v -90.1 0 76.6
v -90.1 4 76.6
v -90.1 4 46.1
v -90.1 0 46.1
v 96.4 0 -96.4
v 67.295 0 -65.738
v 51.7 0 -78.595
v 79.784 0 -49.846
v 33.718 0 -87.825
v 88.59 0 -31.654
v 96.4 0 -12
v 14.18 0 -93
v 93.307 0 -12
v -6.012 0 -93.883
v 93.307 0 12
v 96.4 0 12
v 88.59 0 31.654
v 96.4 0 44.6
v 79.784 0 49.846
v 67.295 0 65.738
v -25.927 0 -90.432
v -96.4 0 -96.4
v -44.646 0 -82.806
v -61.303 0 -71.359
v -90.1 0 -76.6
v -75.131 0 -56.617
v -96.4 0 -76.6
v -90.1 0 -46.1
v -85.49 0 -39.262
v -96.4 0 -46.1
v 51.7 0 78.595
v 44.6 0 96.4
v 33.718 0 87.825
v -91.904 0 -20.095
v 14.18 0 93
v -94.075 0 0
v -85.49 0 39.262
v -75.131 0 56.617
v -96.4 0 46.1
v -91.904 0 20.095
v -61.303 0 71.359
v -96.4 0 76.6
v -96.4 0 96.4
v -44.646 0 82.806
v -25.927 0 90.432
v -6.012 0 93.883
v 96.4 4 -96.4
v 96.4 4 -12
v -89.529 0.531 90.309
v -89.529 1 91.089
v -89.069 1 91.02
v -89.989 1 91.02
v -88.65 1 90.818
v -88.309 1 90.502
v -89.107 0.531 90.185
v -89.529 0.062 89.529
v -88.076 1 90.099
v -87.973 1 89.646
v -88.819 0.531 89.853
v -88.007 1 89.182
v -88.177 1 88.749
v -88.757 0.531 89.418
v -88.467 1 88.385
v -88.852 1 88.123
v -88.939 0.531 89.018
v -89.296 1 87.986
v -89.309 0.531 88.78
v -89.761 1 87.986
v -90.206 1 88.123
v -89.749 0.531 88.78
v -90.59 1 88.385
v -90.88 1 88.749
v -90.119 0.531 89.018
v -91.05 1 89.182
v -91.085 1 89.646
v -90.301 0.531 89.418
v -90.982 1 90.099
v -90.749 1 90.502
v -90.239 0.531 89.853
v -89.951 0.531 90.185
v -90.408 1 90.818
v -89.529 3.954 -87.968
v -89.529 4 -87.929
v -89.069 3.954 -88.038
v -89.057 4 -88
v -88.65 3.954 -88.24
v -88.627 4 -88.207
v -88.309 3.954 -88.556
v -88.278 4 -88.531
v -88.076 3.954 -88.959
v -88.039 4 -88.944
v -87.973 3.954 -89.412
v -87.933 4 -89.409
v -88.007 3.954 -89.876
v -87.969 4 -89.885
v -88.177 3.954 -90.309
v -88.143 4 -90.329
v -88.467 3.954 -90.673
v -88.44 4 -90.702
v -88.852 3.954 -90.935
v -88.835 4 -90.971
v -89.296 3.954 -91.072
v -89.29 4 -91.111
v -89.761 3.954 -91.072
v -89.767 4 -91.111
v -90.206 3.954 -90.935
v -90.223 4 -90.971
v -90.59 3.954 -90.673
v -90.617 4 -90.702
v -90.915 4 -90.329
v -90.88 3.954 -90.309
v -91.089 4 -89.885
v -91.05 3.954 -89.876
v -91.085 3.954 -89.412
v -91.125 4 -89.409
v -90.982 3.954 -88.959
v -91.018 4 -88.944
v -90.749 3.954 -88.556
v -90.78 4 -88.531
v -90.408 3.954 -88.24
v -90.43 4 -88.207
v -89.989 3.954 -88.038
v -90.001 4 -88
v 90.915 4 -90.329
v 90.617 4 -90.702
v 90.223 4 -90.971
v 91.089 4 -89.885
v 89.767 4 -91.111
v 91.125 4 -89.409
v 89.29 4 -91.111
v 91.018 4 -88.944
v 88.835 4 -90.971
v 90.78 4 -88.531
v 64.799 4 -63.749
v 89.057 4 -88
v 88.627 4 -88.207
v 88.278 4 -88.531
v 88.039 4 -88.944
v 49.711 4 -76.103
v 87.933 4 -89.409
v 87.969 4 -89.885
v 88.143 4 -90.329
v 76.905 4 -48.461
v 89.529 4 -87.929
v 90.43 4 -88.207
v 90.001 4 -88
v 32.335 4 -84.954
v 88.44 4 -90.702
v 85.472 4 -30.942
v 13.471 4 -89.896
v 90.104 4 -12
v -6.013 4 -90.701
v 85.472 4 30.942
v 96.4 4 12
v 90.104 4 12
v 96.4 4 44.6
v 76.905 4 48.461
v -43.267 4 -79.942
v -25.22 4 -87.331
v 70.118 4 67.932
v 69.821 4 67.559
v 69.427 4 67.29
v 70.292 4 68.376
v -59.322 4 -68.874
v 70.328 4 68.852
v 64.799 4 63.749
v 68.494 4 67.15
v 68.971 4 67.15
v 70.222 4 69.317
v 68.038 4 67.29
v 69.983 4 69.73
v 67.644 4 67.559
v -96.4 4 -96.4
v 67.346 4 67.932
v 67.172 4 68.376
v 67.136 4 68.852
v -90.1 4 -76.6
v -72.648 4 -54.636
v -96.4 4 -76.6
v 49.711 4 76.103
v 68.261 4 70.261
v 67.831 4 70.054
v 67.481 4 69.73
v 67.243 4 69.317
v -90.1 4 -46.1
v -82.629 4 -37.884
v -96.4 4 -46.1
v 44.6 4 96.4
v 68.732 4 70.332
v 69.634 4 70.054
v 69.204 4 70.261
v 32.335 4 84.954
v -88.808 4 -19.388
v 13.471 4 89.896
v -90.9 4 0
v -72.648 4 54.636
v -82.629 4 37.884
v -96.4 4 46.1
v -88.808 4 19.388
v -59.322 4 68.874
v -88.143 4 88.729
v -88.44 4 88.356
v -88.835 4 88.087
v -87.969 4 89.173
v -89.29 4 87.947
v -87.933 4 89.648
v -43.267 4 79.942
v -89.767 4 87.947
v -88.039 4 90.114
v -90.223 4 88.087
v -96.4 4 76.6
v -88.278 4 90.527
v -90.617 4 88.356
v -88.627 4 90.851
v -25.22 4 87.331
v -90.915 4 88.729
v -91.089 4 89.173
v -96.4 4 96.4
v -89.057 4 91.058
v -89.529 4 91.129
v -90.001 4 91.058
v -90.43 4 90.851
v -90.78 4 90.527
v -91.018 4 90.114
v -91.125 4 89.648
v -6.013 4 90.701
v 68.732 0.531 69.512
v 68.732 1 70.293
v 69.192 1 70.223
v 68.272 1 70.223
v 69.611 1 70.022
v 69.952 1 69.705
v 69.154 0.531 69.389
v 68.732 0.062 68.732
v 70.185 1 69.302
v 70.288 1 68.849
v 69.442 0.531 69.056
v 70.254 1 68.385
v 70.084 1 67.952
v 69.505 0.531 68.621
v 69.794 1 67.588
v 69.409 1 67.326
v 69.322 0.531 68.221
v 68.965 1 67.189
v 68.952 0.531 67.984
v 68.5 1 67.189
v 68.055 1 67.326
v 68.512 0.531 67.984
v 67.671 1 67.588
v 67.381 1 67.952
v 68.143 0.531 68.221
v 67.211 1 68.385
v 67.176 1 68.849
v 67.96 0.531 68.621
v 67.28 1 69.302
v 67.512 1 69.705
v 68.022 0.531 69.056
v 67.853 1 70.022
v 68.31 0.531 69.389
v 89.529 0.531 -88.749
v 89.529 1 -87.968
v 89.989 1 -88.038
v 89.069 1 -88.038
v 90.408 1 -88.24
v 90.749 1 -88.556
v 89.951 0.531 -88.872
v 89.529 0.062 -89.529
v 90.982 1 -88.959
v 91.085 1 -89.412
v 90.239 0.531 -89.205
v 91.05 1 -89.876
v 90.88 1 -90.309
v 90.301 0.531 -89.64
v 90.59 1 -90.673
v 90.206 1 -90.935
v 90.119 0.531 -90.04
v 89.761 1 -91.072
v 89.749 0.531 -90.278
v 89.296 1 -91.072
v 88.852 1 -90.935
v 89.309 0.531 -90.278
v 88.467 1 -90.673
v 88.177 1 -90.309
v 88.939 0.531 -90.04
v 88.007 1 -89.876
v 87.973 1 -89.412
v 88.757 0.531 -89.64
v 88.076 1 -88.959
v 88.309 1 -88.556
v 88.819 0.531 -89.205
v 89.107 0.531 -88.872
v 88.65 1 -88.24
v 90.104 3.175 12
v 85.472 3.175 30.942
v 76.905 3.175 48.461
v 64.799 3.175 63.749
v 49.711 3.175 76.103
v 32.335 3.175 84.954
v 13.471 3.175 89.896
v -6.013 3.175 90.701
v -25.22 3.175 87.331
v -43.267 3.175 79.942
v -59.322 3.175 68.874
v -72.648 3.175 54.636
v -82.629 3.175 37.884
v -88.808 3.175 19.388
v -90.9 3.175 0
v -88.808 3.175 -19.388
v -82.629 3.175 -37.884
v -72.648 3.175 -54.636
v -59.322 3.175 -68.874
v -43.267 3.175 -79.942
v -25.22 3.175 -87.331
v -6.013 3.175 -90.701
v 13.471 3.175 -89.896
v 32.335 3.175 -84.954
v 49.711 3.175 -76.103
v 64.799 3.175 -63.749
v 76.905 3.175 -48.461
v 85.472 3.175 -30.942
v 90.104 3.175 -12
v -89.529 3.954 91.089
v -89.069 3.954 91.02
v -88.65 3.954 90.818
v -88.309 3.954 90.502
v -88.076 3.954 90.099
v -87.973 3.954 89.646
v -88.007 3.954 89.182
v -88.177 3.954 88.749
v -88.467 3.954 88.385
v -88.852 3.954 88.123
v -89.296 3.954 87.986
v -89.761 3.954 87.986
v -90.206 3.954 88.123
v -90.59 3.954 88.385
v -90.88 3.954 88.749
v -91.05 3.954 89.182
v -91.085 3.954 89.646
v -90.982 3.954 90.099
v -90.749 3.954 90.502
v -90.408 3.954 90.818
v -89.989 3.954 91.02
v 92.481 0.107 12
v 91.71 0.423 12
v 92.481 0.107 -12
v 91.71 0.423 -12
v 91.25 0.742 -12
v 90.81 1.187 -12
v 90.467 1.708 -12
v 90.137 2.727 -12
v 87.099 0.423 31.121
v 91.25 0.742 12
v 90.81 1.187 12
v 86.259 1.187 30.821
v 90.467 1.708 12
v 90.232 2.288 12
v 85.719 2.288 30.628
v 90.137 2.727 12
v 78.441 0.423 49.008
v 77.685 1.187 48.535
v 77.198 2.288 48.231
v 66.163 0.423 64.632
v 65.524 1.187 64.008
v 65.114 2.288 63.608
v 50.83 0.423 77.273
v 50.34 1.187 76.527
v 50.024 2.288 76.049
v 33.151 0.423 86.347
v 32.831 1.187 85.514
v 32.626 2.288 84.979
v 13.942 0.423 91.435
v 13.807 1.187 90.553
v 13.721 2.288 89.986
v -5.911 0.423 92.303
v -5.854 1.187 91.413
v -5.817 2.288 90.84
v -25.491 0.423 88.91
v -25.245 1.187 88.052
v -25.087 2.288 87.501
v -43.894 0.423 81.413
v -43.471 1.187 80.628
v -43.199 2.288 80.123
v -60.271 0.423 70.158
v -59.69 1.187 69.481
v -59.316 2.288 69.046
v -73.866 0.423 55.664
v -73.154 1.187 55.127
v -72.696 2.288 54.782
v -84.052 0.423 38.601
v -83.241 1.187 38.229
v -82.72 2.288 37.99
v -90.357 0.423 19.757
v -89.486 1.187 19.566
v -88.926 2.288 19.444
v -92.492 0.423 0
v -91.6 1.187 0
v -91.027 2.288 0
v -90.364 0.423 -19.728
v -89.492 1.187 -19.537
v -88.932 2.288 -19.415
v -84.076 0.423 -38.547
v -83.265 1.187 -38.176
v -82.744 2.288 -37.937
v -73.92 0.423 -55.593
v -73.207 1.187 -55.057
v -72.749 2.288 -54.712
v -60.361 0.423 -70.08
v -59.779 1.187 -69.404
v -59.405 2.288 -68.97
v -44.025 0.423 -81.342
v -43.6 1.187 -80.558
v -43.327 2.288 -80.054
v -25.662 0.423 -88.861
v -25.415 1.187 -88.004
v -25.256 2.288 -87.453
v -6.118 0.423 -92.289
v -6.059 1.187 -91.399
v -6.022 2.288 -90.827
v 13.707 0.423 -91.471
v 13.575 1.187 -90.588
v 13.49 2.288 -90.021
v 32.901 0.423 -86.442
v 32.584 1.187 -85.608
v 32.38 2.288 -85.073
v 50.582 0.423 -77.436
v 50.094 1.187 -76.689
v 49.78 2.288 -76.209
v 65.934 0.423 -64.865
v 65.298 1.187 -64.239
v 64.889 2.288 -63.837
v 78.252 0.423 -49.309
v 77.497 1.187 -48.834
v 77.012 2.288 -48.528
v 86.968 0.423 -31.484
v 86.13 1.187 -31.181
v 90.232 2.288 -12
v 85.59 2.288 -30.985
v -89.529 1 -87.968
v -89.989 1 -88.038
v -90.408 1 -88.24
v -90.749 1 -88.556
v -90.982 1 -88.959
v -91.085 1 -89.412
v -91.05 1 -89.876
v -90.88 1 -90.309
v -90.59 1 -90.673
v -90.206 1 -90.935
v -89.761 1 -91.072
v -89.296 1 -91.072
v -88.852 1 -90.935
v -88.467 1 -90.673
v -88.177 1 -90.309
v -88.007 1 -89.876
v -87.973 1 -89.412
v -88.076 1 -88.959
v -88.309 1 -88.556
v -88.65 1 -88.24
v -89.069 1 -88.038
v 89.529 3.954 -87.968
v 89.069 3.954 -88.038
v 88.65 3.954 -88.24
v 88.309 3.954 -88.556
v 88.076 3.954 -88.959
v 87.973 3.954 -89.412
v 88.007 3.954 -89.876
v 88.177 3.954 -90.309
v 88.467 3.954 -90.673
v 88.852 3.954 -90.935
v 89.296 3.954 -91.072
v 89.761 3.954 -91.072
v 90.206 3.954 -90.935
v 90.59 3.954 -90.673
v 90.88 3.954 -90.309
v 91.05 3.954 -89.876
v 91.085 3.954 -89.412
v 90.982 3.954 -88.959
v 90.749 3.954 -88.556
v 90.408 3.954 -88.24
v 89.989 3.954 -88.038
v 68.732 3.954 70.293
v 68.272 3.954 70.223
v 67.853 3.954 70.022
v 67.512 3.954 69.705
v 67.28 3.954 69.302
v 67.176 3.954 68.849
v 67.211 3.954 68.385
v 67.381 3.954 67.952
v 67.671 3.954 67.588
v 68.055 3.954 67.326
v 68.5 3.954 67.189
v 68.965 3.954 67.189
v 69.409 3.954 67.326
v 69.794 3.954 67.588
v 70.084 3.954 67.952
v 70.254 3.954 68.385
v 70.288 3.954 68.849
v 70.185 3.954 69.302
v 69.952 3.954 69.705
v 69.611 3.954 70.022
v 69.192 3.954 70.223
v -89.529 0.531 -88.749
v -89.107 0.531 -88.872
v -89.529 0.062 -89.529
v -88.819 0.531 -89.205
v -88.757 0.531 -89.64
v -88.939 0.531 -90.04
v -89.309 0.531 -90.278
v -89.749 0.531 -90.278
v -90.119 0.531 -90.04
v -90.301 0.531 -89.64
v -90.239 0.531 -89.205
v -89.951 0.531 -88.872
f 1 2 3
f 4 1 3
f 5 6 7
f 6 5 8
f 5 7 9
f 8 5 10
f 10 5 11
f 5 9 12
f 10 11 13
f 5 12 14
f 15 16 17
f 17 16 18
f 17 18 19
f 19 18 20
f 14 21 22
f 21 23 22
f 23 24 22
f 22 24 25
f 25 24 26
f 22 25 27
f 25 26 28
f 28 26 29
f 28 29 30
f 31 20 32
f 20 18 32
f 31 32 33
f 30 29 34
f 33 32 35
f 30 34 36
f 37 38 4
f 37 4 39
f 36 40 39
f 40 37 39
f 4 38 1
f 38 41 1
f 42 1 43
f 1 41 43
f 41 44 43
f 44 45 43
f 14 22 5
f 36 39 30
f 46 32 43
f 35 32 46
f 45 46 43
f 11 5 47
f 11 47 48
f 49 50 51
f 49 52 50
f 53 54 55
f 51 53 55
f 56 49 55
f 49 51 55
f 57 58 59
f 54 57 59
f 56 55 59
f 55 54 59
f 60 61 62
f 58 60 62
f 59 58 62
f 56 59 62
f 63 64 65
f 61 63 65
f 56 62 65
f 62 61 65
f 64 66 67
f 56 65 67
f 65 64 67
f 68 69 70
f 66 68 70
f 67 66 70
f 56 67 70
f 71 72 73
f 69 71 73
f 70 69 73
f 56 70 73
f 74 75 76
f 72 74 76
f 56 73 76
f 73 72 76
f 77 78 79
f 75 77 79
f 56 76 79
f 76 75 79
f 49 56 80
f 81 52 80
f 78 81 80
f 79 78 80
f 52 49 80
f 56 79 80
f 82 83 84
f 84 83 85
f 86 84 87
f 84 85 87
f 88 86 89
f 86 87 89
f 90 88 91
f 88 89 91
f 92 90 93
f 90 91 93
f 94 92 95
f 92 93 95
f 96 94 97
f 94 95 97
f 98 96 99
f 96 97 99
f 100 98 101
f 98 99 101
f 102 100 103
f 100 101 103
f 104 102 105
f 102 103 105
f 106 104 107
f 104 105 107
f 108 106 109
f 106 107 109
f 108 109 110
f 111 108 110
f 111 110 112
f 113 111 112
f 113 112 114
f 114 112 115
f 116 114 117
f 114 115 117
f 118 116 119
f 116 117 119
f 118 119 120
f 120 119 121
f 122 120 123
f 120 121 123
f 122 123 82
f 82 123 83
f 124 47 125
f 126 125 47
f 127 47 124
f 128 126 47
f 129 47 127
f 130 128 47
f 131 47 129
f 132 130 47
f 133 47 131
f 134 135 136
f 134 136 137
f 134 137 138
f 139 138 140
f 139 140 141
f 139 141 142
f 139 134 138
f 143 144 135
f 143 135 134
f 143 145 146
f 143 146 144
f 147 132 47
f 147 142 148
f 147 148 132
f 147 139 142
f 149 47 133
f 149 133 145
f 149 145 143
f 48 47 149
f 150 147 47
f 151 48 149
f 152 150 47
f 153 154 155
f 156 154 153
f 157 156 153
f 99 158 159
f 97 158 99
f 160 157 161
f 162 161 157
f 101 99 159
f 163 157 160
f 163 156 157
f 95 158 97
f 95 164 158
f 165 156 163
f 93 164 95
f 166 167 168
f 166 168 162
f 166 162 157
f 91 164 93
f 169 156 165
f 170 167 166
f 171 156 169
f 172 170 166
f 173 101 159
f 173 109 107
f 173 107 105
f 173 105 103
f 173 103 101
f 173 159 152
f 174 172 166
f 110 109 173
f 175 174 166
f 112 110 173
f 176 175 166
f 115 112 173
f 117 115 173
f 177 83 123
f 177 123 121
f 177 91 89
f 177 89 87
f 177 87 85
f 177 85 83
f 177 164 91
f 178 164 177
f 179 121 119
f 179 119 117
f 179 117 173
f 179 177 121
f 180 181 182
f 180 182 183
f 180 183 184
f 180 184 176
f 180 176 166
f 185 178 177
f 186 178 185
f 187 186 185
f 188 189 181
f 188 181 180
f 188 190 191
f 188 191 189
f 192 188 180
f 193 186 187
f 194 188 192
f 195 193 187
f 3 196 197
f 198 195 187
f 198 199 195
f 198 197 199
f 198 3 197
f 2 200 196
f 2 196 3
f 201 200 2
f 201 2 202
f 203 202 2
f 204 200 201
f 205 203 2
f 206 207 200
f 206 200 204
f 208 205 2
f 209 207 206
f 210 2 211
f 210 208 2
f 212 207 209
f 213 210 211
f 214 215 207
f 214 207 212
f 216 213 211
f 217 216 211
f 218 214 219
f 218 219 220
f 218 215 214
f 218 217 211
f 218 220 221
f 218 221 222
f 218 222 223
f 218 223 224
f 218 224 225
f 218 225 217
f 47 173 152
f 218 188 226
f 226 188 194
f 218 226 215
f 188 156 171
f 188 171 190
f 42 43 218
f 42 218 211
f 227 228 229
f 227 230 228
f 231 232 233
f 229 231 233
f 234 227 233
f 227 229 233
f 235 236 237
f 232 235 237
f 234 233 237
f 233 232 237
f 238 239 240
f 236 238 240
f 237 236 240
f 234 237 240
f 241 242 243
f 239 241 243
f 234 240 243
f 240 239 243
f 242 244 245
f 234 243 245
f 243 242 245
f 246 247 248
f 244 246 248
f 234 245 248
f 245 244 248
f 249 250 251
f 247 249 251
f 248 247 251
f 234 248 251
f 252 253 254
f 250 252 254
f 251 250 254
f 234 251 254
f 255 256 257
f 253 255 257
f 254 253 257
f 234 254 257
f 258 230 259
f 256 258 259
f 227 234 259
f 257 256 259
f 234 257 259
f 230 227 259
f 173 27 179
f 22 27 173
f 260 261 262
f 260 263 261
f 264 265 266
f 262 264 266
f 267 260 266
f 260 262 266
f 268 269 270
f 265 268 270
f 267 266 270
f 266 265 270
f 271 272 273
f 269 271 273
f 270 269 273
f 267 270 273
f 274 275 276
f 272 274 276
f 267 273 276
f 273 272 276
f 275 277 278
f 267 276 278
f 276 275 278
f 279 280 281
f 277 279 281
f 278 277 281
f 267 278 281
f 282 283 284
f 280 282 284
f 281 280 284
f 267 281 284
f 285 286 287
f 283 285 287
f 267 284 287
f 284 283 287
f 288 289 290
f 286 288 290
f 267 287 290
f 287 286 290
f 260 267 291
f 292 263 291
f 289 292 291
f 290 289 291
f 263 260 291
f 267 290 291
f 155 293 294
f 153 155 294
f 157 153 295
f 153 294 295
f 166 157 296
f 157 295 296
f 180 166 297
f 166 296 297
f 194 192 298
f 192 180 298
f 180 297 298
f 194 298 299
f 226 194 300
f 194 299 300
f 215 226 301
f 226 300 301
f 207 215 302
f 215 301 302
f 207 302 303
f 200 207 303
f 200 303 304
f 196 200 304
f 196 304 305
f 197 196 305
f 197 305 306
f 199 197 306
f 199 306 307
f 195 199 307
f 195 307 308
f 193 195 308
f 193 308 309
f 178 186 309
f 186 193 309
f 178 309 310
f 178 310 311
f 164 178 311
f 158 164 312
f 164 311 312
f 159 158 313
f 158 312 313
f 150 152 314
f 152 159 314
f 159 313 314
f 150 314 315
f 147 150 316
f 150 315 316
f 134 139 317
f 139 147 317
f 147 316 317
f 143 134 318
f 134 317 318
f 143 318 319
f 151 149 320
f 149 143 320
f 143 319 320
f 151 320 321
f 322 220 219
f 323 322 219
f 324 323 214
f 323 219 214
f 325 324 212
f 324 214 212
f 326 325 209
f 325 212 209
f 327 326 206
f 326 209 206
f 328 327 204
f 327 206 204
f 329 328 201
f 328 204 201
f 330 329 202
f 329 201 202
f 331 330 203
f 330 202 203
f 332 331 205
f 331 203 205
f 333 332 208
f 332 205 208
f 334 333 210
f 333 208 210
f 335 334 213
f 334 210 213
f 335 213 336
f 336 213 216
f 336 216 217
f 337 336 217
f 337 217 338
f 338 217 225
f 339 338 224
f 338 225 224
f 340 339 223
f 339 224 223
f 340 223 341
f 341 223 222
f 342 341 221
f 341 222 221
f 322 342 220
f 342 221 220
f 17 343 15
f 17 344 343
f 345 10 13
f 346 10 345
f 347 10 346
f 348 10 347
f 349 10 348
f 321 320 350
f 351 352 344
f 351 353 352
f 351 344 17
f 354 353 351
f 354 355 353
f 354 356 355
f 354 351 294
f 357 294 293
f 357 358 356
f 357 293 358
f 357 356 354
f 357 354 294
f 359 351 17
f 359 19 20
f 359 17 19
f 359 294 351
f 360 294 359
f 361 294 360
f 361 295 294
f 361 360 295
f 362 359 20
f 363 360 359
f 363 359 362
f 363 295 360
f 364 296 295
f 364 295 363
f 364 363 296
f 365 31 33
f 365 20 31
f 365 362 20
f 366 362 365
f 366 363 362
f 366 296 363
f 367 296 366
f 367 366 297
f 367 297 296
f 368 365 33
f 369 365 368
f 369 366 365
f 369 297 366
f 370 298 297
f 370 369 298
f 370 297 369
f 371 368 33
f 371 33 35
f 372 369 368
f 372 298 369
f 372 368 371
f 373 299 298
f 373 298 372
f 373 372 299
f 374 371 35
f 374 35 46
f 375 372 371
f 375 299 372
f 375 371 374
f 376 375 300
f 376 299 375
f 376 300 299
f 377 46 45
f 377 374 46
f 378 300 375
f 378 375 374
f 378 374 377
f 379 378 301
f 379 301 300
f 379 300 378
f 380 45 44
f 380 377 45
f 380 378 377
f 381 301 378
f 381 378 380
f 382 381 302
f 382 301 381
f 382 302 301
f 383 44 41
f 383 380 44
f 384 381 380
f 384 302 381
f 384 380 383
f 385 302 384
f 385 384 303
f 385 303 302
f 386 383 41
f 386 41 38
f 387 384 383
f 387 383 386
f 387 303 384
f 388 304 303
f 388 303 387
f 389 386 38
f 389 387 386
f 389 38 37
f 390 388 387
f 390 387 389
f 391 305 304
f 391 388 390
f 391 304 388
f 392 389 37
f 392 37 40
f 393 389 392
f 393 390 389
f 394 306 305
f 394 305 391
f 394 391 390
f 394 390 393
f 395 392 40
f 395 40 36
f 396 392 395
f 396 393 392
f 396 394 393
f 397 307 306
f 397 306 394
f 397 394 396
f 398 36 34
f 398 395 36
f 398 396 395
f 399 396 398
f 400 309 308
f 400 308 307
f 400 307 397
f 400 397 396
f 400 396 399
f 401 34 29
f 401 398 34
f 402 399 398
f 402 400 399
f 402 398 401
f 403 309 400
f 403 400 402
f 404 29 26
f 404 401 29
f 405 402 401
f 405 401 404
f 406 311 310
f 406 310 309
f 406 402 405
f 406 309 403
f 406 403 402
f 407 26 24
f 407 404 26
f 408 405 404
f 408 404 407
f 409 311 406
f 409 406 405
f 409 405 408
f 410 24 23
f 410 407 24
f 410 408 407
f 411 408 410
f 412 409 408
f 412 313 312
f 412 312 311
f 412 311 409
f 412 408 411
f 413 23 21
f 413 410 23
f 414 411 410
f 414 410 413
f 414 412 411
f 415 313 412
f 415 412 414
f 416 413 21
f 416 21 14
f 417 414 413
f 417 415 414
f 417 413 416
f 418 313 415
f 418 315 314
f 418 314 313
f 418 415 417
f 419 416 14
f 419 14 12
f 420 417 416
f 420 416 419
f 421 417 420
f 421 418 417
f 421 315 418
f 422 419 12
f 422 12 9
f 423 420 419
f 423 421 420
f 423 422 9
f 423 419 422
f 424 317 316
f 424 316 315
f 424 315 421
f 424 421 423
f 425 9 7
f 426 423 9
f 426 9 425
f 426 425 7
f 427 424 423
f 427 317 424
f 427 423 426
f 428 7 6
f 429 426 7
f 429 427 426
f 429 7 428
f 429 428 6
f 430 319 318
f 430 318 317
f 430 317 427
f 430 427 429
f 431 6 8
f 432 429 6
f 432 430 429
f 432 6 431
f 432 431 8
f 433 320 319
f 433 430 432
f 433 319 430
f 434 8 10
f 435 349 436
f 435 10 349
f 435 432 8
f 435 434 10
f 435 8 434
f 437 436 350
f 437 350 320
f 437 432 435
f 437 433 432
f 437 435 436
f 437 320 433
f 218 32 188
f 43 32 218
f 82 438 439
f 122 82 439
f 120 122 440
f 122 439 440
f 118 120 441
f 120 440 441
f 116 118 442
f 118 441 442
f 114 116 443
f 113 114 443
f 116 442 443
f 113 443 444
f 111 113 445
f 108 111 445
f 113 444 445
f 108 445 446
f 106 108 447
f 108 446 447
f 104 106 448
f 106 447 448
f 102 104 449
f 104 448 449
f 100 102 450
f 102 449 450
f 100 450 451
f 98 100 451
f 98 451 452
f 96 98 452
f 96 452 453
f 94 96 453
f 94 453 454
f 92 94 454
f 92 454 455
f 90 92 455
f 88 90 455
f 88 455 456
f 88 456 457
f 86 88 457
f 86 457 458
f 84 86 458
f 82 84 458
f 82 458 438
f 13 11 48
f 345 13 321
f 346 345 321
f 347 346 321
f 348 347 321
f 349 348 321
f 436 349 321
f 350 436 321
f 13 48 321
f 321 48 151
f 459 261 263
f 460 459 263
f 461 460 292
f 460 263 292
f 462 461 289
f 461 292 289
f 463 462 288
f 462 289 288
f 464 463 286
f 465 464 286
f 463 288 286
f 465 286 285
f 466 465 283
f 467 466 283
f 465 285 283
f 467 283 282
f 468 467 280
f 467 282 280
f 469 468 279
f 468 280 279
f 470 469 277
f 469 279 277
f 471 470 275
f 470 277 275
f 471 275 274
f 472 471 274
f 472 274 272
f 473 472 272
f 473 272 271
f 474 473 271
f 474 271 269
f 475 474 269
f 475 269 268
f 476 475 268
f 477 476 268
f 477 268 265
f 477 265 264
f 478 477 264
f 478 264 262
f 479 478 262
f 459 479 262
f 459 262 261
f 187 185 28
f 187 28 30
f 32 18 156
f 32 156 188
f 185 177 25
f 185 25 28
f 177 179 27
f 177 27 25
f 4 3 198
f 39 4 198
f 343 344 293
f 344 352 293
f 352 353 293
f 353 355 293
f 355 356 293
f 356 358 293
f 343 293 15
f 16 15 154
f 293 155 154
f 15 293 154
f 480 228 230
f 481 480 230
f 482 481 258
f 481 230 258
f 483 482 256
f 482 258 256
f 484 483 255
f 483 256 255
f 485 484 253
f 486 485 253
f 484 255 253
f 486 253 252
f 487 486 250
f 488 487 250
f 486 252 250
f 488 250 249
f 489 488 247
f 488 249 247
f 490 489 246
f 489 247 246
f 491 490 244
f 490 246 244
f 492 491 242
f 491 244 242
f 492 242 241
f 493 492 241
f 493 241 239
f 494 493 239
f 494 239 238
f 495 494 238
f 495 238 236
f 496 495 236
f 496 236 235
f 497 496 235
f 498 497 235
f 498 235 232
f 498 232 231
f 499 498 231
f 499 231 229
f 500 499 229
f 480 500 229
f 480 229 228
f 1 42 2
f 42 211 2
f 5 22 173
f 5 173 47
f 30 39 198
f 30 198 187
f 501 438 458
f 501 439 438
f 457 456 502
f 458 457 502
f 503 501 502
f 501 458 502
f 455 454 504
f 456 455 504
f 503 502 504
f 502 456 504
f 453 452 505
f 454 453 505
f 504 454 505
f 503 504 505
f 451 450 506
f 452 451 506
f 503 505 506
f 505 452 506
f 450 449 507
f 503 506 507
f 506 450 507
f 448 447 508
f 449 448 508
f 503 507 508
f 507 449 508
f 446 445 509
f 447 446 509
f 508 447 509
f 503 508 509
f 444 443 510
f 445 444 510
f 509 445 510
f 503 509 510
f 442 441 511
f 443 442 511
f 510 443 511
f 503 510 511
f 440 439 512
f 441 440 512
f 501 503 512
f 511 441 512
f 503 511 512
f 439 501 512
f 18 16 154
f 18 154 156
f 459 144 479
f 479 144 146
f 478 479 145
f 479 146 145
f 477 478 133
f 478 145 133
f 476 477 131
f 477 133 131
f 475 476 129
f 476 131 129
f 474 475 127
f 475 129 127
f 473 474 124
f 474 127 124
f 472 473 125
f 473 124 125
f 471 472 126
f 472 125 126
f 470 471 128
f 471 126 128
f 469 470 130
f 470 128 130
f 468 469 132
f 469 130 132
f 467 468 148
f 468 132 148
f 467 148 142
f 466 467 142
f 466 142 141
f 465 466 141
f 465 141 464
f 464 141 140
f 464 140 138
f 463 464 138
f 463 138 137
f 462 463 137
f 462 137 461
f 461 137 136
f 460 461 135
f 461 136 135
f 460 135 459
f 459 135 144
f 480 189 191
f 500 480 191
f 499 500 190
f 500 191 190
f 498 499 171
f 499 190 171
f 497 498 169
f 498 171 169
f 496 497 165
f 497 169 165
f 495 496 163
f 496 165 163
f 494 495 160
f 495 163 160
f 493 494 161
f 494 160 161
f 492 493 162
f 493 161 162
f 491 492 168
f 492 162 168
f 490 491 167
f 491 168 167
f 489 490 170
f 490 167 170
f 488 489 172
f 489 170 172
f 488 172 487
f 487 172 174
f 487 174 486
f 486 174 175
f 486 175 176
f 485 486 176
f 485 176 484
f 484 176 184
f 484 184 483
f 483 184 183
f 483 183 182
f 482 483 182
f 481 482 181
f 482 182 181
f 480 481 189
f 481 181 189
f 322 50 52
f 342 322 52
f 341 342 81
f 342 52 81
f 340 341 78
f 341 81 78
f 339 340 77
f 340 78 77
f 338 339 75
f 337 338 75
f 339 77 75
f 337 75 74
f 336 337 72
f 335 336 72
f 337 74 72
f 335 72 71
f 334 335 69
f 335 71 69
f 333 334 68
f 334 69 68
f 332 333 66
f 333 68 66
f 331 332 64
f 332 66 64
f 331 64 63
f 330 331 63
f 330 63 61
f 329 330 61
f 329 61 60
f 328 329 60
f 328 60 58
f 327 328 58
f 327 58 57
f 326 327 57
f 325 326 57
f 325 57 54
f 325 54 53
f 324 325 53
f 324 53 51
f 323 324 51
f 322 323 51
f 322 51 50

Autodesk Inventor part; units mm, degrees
ref_plane "YZ Plane" through (0, 0, 0) normal (1, 0, 0) x (0, 1, 0)
ref_plane "XZ Plane" through (0, 0, 0) normal (0, 1, 0) x (-1, 0, 0)
ref_plane "XY Plane" through (0, 0, 0) normal (0, 0, 1) x (1, 0, 0)
sketch "Sketch1" plane through (0, 0, 0) normal (0, 1, 0) x (-1, 0, 0)
  line L0 (101.6, -101.6) -> (-101.6, -101.6)
  line L1 (-101.6, -101.6) -> (-101.6, 101.6)
  line L2 (-101.6, 101.6) -> (101.6, 101.6)
  line L3 (101.6, 101.6) -> (101.6, -101.6)
  line L4 (96.6, -96.6) -> (-96.6, -96.6)
  line L5 (-96.6, -96.6) -> (-96.6, 96.6)
  line L6 (-96.6, 96.6) -> (96.6, 96.6)
  line L7 (96.6, 96.6) -> (96.6, -96.6)
  line L8 (101.6, 101.6) -> (-40.4, 101.6)
  circle A0 centre (0, 0) radius 88.9
  line L9 (-40.4, 101.6) -> (-101.6, 40.4)
  line L10 (-45.4, 101.6) -> (-101.6, 45.4)
  line L11 (96.6, 96.6) -> (96.6, 101.6)
  line L12 (-45.4, 101.6) -> (-35.4, 101.6)
  line L13 (-35.4, 101.6) -> (-35.4, 96.6)
  line L14 (-35.4, 96.6) -> (-45.4, 96.6)
  line L15 (-45.4, 96.6) -> (-45.4, 101.6)
  line L16 (-101.6, 39.4) -> (-39.4, 101.6)
  line L17 (96.4, -96.4) -> (-96.4, -96.4)
  line L18 (-96.4, -96.4) -> (-96.4, 96.4)
  line L19 (-96.4, 96.4) -> (96.4, 96.4)
  line L20 (96.4, 96.4) -> (96.4, -96.4)
  circle A1 centre (0, 0) radius 90.9
  point P0 (96.6, 51.2168)
  point P1 (101.6, 40.4)
  point P2 (101.6, -40.4)
  point P3 (96.6, -51.2168)
  point P4 (-96.6, 45.4)
  point P5 (-45.4, 96.6)
  point P6 (-44.6, 96.4)
  point P7 (-96.4, 44.6)
  dimension "d0" = 203.2
  dimension "d1" = 203.2
  dimension "d2" = 101.6
  dimension "d3" = 101.6
  dimension "d4" = 5
  dimension "d5" = 5
  dimension "d6" = 5
  dimension "d7" = 5
  dimension "d8" = 142
  dimension "d9" = 61.2
  dimension "d10" = 177.8
  dimension "d11" = 5
  dimension "d12" = 5
  dimension "d13" = 10
  dimension "d14" = 1
  dimension "d15" = 0.2
  dimension "d16" = 0.2
  dimension "d17" = 0.2
  dimension "d18" = 0.2
  dimension "d64" = 181.8
extrude "Extrusion1" add sketch "Sketch1" along normal blind 4 contours L16 L19 L20 L17 L18
sketch "Sketch6" plane through (0, 4, 0) normal (0, 1, 0) x (1, 0, 0)
  line L0 (96.4, 96.4) -> (-96.4, 96.4) projected
  line L1 (96.4, 96.4) -> (88.4, 96.4)
  line L2 (88.4, 96.4) -> (88.4, -45.6)
  line L3 (88.4, -45.6) -> (96.4, -45.6)
  line L4 (96.4, -45.6) -> (96.4, 96.4)
  line L5 (96.4, -44.6) -> (96.4, 96.4) projected
  line L6 (88.4, -12) -> (96.4, -12)
  line L7 (96.4, -12) -> (96.4, 12)
  line L8 (96.4, 12) -> (88.4, 12)
  line L9 (88.4, 12) -> (88.4, -12)
  line L10 (0, 0) -> (96.4, 0)
  point P0 (96.4, -12)
  dimension "d58" = 8
  dimension "d59" = 142
  dimension "d62" = 12
  dimension "d63" = 12
extrude "Extrusion6" cut sketch "Sketch6" against normal blind 25.4 contours L4 L10 L2 L8 | L4 L6 L2 L10
sketch "Sketch8" plane through (0, 4, 0) normal (0, 1, 0) x (1, 0, 0)
  line L0 (-96.6, 96.6) -> (-96.6, -96.6)
  line L1 (96.6, 96.6) -> (-96.6, 96.6)
  line L2 (-96.6, 96.6) -> (96.6, 96.6)
  line L3 (96.6, -45.4) -> (45.4, -96.6)
  line L4 (96.6, 96.6) -> (96.6, -45.4)
  line L5 (96.6, -45.4) -> (45.4, -96.6)
  line L6 (45.4, -96.6) -> (-96.6, -96.6)
  line L7 (-96.6, -96.6) -> (-96.6, 96.6)
  line L8 (-96.6, 96.6) -> (-89.5289, 89.5289)
  circle A0 centre (-89.5289, 89.5289) radius 5
  circle A1 centre (-89.5289, 89.5289) radius 1.5
  line L9 (-89.5289, 84.5289) -> (-96.6, 84.5289)
  line L10 (-89.5289, 89.5289) -> (-89.5289, 84.5289)
  line L11 (-89.5289, 89.5289) -> (-84.5289, 89.5289)
  line L12 (-84.5289, 96.6) -> (-84.5289, 89.5289)
  line L13 (-96.6, -96.6) -> (-89.5289, -89.5289)
  line L14 (-96.6, -96.6) -> (-86.6, -96.6) construction
  circle A2 centre (-89.5289, -89.5289) radius 5
  circle A3 centre (-89.5289, -89.5289) radius 1.75
  line L15 (-89.5289, -89.5289) -> (-84.5289, -89.5289)
  line L16 (-84.5289, -96.6) -> (-84.5289, -89.5289)
  line L17 (-89.5289, -89.5289) -> (-89.5289, -84.5289)
  line L18 (-96.6, -84.5289) -> (-89.5289, -84.5289)
  line L19 (96.6, 96.6) -> (89.5289, 89.5289)
  circle A4 centre (89.5289, 89.5289) radius 5
  circle A5 centre (89.5289, 89.5289) radius 1.75
  line L20 (89.5289, 89.5289) -> (84.5289, 89.5289)
  line L21 (84.5289, 96.6) -> (84.5289, 89.5289)
  line L22 (89.5289, 89.5289) -> (89.5289, 84.5289)
  line L23 (96.6, 84.5289) -> (89.5289, 84.5289)
  line L24 (96.6, -43.114) -> (96.6, 96.6)
  line L25 (-96.6, -96.6) -> (43.1178, -96.6)
  line L26 (28.9914, 5.6569) -> (-5.6569, -28.9914)
  line L27 (25.4, -25.4) -> (101.6, -25.4)
  line L28 (101.6, -88.9) -> (101.6, 101.6)
  line L29 (25.4, -25.4) -> (25.4, -101.6)
  line L30 (43.1178, -101.6) -> (-101.6, -101.6)
  line L31 (96.6, -25.4) -> (86.6, -25.4)
  circle A6 centre (86.6, -25.4) radius 5
  circle A7 centre (86.6, -25.4) radius 1.75
  line L32 (25.4, -96.6) -> (25.4, -86.6)
  circle A8 centre (25.4, -86.6) radius 5
  circle A9 centre (25.4, -86.6) radius 1.75
  line L33 (44.6, -96.4) -> (96.4, -44.6) projected
  circle A10 centre (68.7322, -68.7322) radius 1
  point P0 (0, 0)
  point P1 (0, 0)
  point P2 (0, 0)
  dimension "d90" = 10
  dimension "d91" = 3
  dimension "d92" = 10
  dimension "d93" = 45
  dimension "d94" = 10
  dimension "d95" = 3.5
  dimension "d96" = 10
  dimension "d97" = 10
  dimension "d98" = 3.5
  dimension "d99" = 76.2
  dimension "d100" = 76.2
  dimension "d101" = 10
  dimension "d102" = 10
  dimension "d103" = 3.5
  dimension "d104" = 10
  dimension "d105" = 10
  dimension "d106" = 3.5
  dimension "d115" = 2
  dimension "d116" = 2.5
hole "Hole1" at (-89.5289, 4, -89.5289) at (89.5289, 4, -89.5289) at (-89.5289, 4, 89.5289) at (68.7322, 4, 68.7322) direction (0, -1, 0) diameter 3.1211 depth 3 tip angle 118 countersink diameter 3.2004 countersink angle 82 thread size "M3.5x0.35" class "6H" standard "ANSI Metric M Profile"
fillet "Fillet1" radius 3.175 2 edges at (-6.0132, 0, -90.7009) (-6.0132, 0, 90.7009)
sketch "Sketch9" plane through (0, 4, 0) normal (0, 1, 0) x (1, 0, 0)
  arc A0 (-101.6, -98.425) -> (-98.425, -101.6) centre (-98.425, -98.425) ccw
  line L0 (44.0849, 101.6) -> (-98.425, 101.6)
  line L1 (-101.6, 98.425) -> (-101.6, -98.425)
  line L2 (-101.6, -46.1) -> (-101.6, -76.6)
  line L3 (-96.6, -96.6) -> (-96.6, 96.6)
  line L4 (-96.6, -46.1) -> (-96.6, -76.6)
  line L5 (-101.6, -76.6) -> (-96.6, -76.6)
  line L6 (-101.6, -46.1) -> (-96.6, -46.1)
  line L7 (-98.425, -101.6) -> (101.6, -101.6)
  line L8 (0, 0) -> (-101.6, 0)
  line L9 (-101.6, 46.1) -> (-101.6, 76.6)
  line L10 (-96.6, 46.1) -> (-96.6, 76.6)
  line L11 (-101.6, 76.6) -> (-96.6, 76.6)
  line L12 (-101.6, 46.1) -> (-96.6, 46.1)
  line L13 (-96.6, -76.6) -> (-90.1, -76.6)
  line L14 (-90.1, -76.6) -> (-90.1, -46.1)
  line L15 (-90.1, -46.1) -> (-96.6, -46.1)
  line L16 (-96.6, -46.1) -> (-96.6, -76.6)
  arc A1 (-98.425, 101.6) -> (-101.6, 98.425) centre (-98.425, 98.425) ccw
  line L17 (-101.6, 46.1) -> (-96.6, 46.1)
  line L18 (-90.1, 46.1) -> (-96.6, 46.1)
  line L19 (-101.6, 46.1) -> (-101.6, 76.6)
  line L20 (-96.6, 46.1) -> (-96.6, 76.6)
  line L21 (-96.6, 46.1) -> (-96.6, 76.6)
  line L22 (-90.1, 76.6) -> (-90.1, 46.1)
  line L23 (-101.6, 76.6) -> (-96.6, 76.6)
  line L24 (-96.6, 76.6) -> (-90.1, 76.6)
  point P0 (-98.425, 98.425)
  point P1 (46.1, 101.6)
  point P2 (46.1, 96.6)
  point P3 (76.6, 96.6)
  point P4 (76.6, 101.6)
  point P5 (-46.1, 96.6)
  dimension "d117" = 30.5
  dimension "d118" = 25
  dimension "d119" = 6.5
extrude "Extrusion7" cut sketch "Sketch9" against normal blind 25.4 contours L24 L22 L18 L3 | L15 L14 L13 L3
equation "\"d1\" = d0"
equation "\"d2\" = 0.5 * d0"
equation "\"d3\" = 0.5 * d0"
equation "\"d15\" = d17"
equation "\"d16\" = d17"
equation "\"d18\" = d17"
properties part number "Drop_Plate"
